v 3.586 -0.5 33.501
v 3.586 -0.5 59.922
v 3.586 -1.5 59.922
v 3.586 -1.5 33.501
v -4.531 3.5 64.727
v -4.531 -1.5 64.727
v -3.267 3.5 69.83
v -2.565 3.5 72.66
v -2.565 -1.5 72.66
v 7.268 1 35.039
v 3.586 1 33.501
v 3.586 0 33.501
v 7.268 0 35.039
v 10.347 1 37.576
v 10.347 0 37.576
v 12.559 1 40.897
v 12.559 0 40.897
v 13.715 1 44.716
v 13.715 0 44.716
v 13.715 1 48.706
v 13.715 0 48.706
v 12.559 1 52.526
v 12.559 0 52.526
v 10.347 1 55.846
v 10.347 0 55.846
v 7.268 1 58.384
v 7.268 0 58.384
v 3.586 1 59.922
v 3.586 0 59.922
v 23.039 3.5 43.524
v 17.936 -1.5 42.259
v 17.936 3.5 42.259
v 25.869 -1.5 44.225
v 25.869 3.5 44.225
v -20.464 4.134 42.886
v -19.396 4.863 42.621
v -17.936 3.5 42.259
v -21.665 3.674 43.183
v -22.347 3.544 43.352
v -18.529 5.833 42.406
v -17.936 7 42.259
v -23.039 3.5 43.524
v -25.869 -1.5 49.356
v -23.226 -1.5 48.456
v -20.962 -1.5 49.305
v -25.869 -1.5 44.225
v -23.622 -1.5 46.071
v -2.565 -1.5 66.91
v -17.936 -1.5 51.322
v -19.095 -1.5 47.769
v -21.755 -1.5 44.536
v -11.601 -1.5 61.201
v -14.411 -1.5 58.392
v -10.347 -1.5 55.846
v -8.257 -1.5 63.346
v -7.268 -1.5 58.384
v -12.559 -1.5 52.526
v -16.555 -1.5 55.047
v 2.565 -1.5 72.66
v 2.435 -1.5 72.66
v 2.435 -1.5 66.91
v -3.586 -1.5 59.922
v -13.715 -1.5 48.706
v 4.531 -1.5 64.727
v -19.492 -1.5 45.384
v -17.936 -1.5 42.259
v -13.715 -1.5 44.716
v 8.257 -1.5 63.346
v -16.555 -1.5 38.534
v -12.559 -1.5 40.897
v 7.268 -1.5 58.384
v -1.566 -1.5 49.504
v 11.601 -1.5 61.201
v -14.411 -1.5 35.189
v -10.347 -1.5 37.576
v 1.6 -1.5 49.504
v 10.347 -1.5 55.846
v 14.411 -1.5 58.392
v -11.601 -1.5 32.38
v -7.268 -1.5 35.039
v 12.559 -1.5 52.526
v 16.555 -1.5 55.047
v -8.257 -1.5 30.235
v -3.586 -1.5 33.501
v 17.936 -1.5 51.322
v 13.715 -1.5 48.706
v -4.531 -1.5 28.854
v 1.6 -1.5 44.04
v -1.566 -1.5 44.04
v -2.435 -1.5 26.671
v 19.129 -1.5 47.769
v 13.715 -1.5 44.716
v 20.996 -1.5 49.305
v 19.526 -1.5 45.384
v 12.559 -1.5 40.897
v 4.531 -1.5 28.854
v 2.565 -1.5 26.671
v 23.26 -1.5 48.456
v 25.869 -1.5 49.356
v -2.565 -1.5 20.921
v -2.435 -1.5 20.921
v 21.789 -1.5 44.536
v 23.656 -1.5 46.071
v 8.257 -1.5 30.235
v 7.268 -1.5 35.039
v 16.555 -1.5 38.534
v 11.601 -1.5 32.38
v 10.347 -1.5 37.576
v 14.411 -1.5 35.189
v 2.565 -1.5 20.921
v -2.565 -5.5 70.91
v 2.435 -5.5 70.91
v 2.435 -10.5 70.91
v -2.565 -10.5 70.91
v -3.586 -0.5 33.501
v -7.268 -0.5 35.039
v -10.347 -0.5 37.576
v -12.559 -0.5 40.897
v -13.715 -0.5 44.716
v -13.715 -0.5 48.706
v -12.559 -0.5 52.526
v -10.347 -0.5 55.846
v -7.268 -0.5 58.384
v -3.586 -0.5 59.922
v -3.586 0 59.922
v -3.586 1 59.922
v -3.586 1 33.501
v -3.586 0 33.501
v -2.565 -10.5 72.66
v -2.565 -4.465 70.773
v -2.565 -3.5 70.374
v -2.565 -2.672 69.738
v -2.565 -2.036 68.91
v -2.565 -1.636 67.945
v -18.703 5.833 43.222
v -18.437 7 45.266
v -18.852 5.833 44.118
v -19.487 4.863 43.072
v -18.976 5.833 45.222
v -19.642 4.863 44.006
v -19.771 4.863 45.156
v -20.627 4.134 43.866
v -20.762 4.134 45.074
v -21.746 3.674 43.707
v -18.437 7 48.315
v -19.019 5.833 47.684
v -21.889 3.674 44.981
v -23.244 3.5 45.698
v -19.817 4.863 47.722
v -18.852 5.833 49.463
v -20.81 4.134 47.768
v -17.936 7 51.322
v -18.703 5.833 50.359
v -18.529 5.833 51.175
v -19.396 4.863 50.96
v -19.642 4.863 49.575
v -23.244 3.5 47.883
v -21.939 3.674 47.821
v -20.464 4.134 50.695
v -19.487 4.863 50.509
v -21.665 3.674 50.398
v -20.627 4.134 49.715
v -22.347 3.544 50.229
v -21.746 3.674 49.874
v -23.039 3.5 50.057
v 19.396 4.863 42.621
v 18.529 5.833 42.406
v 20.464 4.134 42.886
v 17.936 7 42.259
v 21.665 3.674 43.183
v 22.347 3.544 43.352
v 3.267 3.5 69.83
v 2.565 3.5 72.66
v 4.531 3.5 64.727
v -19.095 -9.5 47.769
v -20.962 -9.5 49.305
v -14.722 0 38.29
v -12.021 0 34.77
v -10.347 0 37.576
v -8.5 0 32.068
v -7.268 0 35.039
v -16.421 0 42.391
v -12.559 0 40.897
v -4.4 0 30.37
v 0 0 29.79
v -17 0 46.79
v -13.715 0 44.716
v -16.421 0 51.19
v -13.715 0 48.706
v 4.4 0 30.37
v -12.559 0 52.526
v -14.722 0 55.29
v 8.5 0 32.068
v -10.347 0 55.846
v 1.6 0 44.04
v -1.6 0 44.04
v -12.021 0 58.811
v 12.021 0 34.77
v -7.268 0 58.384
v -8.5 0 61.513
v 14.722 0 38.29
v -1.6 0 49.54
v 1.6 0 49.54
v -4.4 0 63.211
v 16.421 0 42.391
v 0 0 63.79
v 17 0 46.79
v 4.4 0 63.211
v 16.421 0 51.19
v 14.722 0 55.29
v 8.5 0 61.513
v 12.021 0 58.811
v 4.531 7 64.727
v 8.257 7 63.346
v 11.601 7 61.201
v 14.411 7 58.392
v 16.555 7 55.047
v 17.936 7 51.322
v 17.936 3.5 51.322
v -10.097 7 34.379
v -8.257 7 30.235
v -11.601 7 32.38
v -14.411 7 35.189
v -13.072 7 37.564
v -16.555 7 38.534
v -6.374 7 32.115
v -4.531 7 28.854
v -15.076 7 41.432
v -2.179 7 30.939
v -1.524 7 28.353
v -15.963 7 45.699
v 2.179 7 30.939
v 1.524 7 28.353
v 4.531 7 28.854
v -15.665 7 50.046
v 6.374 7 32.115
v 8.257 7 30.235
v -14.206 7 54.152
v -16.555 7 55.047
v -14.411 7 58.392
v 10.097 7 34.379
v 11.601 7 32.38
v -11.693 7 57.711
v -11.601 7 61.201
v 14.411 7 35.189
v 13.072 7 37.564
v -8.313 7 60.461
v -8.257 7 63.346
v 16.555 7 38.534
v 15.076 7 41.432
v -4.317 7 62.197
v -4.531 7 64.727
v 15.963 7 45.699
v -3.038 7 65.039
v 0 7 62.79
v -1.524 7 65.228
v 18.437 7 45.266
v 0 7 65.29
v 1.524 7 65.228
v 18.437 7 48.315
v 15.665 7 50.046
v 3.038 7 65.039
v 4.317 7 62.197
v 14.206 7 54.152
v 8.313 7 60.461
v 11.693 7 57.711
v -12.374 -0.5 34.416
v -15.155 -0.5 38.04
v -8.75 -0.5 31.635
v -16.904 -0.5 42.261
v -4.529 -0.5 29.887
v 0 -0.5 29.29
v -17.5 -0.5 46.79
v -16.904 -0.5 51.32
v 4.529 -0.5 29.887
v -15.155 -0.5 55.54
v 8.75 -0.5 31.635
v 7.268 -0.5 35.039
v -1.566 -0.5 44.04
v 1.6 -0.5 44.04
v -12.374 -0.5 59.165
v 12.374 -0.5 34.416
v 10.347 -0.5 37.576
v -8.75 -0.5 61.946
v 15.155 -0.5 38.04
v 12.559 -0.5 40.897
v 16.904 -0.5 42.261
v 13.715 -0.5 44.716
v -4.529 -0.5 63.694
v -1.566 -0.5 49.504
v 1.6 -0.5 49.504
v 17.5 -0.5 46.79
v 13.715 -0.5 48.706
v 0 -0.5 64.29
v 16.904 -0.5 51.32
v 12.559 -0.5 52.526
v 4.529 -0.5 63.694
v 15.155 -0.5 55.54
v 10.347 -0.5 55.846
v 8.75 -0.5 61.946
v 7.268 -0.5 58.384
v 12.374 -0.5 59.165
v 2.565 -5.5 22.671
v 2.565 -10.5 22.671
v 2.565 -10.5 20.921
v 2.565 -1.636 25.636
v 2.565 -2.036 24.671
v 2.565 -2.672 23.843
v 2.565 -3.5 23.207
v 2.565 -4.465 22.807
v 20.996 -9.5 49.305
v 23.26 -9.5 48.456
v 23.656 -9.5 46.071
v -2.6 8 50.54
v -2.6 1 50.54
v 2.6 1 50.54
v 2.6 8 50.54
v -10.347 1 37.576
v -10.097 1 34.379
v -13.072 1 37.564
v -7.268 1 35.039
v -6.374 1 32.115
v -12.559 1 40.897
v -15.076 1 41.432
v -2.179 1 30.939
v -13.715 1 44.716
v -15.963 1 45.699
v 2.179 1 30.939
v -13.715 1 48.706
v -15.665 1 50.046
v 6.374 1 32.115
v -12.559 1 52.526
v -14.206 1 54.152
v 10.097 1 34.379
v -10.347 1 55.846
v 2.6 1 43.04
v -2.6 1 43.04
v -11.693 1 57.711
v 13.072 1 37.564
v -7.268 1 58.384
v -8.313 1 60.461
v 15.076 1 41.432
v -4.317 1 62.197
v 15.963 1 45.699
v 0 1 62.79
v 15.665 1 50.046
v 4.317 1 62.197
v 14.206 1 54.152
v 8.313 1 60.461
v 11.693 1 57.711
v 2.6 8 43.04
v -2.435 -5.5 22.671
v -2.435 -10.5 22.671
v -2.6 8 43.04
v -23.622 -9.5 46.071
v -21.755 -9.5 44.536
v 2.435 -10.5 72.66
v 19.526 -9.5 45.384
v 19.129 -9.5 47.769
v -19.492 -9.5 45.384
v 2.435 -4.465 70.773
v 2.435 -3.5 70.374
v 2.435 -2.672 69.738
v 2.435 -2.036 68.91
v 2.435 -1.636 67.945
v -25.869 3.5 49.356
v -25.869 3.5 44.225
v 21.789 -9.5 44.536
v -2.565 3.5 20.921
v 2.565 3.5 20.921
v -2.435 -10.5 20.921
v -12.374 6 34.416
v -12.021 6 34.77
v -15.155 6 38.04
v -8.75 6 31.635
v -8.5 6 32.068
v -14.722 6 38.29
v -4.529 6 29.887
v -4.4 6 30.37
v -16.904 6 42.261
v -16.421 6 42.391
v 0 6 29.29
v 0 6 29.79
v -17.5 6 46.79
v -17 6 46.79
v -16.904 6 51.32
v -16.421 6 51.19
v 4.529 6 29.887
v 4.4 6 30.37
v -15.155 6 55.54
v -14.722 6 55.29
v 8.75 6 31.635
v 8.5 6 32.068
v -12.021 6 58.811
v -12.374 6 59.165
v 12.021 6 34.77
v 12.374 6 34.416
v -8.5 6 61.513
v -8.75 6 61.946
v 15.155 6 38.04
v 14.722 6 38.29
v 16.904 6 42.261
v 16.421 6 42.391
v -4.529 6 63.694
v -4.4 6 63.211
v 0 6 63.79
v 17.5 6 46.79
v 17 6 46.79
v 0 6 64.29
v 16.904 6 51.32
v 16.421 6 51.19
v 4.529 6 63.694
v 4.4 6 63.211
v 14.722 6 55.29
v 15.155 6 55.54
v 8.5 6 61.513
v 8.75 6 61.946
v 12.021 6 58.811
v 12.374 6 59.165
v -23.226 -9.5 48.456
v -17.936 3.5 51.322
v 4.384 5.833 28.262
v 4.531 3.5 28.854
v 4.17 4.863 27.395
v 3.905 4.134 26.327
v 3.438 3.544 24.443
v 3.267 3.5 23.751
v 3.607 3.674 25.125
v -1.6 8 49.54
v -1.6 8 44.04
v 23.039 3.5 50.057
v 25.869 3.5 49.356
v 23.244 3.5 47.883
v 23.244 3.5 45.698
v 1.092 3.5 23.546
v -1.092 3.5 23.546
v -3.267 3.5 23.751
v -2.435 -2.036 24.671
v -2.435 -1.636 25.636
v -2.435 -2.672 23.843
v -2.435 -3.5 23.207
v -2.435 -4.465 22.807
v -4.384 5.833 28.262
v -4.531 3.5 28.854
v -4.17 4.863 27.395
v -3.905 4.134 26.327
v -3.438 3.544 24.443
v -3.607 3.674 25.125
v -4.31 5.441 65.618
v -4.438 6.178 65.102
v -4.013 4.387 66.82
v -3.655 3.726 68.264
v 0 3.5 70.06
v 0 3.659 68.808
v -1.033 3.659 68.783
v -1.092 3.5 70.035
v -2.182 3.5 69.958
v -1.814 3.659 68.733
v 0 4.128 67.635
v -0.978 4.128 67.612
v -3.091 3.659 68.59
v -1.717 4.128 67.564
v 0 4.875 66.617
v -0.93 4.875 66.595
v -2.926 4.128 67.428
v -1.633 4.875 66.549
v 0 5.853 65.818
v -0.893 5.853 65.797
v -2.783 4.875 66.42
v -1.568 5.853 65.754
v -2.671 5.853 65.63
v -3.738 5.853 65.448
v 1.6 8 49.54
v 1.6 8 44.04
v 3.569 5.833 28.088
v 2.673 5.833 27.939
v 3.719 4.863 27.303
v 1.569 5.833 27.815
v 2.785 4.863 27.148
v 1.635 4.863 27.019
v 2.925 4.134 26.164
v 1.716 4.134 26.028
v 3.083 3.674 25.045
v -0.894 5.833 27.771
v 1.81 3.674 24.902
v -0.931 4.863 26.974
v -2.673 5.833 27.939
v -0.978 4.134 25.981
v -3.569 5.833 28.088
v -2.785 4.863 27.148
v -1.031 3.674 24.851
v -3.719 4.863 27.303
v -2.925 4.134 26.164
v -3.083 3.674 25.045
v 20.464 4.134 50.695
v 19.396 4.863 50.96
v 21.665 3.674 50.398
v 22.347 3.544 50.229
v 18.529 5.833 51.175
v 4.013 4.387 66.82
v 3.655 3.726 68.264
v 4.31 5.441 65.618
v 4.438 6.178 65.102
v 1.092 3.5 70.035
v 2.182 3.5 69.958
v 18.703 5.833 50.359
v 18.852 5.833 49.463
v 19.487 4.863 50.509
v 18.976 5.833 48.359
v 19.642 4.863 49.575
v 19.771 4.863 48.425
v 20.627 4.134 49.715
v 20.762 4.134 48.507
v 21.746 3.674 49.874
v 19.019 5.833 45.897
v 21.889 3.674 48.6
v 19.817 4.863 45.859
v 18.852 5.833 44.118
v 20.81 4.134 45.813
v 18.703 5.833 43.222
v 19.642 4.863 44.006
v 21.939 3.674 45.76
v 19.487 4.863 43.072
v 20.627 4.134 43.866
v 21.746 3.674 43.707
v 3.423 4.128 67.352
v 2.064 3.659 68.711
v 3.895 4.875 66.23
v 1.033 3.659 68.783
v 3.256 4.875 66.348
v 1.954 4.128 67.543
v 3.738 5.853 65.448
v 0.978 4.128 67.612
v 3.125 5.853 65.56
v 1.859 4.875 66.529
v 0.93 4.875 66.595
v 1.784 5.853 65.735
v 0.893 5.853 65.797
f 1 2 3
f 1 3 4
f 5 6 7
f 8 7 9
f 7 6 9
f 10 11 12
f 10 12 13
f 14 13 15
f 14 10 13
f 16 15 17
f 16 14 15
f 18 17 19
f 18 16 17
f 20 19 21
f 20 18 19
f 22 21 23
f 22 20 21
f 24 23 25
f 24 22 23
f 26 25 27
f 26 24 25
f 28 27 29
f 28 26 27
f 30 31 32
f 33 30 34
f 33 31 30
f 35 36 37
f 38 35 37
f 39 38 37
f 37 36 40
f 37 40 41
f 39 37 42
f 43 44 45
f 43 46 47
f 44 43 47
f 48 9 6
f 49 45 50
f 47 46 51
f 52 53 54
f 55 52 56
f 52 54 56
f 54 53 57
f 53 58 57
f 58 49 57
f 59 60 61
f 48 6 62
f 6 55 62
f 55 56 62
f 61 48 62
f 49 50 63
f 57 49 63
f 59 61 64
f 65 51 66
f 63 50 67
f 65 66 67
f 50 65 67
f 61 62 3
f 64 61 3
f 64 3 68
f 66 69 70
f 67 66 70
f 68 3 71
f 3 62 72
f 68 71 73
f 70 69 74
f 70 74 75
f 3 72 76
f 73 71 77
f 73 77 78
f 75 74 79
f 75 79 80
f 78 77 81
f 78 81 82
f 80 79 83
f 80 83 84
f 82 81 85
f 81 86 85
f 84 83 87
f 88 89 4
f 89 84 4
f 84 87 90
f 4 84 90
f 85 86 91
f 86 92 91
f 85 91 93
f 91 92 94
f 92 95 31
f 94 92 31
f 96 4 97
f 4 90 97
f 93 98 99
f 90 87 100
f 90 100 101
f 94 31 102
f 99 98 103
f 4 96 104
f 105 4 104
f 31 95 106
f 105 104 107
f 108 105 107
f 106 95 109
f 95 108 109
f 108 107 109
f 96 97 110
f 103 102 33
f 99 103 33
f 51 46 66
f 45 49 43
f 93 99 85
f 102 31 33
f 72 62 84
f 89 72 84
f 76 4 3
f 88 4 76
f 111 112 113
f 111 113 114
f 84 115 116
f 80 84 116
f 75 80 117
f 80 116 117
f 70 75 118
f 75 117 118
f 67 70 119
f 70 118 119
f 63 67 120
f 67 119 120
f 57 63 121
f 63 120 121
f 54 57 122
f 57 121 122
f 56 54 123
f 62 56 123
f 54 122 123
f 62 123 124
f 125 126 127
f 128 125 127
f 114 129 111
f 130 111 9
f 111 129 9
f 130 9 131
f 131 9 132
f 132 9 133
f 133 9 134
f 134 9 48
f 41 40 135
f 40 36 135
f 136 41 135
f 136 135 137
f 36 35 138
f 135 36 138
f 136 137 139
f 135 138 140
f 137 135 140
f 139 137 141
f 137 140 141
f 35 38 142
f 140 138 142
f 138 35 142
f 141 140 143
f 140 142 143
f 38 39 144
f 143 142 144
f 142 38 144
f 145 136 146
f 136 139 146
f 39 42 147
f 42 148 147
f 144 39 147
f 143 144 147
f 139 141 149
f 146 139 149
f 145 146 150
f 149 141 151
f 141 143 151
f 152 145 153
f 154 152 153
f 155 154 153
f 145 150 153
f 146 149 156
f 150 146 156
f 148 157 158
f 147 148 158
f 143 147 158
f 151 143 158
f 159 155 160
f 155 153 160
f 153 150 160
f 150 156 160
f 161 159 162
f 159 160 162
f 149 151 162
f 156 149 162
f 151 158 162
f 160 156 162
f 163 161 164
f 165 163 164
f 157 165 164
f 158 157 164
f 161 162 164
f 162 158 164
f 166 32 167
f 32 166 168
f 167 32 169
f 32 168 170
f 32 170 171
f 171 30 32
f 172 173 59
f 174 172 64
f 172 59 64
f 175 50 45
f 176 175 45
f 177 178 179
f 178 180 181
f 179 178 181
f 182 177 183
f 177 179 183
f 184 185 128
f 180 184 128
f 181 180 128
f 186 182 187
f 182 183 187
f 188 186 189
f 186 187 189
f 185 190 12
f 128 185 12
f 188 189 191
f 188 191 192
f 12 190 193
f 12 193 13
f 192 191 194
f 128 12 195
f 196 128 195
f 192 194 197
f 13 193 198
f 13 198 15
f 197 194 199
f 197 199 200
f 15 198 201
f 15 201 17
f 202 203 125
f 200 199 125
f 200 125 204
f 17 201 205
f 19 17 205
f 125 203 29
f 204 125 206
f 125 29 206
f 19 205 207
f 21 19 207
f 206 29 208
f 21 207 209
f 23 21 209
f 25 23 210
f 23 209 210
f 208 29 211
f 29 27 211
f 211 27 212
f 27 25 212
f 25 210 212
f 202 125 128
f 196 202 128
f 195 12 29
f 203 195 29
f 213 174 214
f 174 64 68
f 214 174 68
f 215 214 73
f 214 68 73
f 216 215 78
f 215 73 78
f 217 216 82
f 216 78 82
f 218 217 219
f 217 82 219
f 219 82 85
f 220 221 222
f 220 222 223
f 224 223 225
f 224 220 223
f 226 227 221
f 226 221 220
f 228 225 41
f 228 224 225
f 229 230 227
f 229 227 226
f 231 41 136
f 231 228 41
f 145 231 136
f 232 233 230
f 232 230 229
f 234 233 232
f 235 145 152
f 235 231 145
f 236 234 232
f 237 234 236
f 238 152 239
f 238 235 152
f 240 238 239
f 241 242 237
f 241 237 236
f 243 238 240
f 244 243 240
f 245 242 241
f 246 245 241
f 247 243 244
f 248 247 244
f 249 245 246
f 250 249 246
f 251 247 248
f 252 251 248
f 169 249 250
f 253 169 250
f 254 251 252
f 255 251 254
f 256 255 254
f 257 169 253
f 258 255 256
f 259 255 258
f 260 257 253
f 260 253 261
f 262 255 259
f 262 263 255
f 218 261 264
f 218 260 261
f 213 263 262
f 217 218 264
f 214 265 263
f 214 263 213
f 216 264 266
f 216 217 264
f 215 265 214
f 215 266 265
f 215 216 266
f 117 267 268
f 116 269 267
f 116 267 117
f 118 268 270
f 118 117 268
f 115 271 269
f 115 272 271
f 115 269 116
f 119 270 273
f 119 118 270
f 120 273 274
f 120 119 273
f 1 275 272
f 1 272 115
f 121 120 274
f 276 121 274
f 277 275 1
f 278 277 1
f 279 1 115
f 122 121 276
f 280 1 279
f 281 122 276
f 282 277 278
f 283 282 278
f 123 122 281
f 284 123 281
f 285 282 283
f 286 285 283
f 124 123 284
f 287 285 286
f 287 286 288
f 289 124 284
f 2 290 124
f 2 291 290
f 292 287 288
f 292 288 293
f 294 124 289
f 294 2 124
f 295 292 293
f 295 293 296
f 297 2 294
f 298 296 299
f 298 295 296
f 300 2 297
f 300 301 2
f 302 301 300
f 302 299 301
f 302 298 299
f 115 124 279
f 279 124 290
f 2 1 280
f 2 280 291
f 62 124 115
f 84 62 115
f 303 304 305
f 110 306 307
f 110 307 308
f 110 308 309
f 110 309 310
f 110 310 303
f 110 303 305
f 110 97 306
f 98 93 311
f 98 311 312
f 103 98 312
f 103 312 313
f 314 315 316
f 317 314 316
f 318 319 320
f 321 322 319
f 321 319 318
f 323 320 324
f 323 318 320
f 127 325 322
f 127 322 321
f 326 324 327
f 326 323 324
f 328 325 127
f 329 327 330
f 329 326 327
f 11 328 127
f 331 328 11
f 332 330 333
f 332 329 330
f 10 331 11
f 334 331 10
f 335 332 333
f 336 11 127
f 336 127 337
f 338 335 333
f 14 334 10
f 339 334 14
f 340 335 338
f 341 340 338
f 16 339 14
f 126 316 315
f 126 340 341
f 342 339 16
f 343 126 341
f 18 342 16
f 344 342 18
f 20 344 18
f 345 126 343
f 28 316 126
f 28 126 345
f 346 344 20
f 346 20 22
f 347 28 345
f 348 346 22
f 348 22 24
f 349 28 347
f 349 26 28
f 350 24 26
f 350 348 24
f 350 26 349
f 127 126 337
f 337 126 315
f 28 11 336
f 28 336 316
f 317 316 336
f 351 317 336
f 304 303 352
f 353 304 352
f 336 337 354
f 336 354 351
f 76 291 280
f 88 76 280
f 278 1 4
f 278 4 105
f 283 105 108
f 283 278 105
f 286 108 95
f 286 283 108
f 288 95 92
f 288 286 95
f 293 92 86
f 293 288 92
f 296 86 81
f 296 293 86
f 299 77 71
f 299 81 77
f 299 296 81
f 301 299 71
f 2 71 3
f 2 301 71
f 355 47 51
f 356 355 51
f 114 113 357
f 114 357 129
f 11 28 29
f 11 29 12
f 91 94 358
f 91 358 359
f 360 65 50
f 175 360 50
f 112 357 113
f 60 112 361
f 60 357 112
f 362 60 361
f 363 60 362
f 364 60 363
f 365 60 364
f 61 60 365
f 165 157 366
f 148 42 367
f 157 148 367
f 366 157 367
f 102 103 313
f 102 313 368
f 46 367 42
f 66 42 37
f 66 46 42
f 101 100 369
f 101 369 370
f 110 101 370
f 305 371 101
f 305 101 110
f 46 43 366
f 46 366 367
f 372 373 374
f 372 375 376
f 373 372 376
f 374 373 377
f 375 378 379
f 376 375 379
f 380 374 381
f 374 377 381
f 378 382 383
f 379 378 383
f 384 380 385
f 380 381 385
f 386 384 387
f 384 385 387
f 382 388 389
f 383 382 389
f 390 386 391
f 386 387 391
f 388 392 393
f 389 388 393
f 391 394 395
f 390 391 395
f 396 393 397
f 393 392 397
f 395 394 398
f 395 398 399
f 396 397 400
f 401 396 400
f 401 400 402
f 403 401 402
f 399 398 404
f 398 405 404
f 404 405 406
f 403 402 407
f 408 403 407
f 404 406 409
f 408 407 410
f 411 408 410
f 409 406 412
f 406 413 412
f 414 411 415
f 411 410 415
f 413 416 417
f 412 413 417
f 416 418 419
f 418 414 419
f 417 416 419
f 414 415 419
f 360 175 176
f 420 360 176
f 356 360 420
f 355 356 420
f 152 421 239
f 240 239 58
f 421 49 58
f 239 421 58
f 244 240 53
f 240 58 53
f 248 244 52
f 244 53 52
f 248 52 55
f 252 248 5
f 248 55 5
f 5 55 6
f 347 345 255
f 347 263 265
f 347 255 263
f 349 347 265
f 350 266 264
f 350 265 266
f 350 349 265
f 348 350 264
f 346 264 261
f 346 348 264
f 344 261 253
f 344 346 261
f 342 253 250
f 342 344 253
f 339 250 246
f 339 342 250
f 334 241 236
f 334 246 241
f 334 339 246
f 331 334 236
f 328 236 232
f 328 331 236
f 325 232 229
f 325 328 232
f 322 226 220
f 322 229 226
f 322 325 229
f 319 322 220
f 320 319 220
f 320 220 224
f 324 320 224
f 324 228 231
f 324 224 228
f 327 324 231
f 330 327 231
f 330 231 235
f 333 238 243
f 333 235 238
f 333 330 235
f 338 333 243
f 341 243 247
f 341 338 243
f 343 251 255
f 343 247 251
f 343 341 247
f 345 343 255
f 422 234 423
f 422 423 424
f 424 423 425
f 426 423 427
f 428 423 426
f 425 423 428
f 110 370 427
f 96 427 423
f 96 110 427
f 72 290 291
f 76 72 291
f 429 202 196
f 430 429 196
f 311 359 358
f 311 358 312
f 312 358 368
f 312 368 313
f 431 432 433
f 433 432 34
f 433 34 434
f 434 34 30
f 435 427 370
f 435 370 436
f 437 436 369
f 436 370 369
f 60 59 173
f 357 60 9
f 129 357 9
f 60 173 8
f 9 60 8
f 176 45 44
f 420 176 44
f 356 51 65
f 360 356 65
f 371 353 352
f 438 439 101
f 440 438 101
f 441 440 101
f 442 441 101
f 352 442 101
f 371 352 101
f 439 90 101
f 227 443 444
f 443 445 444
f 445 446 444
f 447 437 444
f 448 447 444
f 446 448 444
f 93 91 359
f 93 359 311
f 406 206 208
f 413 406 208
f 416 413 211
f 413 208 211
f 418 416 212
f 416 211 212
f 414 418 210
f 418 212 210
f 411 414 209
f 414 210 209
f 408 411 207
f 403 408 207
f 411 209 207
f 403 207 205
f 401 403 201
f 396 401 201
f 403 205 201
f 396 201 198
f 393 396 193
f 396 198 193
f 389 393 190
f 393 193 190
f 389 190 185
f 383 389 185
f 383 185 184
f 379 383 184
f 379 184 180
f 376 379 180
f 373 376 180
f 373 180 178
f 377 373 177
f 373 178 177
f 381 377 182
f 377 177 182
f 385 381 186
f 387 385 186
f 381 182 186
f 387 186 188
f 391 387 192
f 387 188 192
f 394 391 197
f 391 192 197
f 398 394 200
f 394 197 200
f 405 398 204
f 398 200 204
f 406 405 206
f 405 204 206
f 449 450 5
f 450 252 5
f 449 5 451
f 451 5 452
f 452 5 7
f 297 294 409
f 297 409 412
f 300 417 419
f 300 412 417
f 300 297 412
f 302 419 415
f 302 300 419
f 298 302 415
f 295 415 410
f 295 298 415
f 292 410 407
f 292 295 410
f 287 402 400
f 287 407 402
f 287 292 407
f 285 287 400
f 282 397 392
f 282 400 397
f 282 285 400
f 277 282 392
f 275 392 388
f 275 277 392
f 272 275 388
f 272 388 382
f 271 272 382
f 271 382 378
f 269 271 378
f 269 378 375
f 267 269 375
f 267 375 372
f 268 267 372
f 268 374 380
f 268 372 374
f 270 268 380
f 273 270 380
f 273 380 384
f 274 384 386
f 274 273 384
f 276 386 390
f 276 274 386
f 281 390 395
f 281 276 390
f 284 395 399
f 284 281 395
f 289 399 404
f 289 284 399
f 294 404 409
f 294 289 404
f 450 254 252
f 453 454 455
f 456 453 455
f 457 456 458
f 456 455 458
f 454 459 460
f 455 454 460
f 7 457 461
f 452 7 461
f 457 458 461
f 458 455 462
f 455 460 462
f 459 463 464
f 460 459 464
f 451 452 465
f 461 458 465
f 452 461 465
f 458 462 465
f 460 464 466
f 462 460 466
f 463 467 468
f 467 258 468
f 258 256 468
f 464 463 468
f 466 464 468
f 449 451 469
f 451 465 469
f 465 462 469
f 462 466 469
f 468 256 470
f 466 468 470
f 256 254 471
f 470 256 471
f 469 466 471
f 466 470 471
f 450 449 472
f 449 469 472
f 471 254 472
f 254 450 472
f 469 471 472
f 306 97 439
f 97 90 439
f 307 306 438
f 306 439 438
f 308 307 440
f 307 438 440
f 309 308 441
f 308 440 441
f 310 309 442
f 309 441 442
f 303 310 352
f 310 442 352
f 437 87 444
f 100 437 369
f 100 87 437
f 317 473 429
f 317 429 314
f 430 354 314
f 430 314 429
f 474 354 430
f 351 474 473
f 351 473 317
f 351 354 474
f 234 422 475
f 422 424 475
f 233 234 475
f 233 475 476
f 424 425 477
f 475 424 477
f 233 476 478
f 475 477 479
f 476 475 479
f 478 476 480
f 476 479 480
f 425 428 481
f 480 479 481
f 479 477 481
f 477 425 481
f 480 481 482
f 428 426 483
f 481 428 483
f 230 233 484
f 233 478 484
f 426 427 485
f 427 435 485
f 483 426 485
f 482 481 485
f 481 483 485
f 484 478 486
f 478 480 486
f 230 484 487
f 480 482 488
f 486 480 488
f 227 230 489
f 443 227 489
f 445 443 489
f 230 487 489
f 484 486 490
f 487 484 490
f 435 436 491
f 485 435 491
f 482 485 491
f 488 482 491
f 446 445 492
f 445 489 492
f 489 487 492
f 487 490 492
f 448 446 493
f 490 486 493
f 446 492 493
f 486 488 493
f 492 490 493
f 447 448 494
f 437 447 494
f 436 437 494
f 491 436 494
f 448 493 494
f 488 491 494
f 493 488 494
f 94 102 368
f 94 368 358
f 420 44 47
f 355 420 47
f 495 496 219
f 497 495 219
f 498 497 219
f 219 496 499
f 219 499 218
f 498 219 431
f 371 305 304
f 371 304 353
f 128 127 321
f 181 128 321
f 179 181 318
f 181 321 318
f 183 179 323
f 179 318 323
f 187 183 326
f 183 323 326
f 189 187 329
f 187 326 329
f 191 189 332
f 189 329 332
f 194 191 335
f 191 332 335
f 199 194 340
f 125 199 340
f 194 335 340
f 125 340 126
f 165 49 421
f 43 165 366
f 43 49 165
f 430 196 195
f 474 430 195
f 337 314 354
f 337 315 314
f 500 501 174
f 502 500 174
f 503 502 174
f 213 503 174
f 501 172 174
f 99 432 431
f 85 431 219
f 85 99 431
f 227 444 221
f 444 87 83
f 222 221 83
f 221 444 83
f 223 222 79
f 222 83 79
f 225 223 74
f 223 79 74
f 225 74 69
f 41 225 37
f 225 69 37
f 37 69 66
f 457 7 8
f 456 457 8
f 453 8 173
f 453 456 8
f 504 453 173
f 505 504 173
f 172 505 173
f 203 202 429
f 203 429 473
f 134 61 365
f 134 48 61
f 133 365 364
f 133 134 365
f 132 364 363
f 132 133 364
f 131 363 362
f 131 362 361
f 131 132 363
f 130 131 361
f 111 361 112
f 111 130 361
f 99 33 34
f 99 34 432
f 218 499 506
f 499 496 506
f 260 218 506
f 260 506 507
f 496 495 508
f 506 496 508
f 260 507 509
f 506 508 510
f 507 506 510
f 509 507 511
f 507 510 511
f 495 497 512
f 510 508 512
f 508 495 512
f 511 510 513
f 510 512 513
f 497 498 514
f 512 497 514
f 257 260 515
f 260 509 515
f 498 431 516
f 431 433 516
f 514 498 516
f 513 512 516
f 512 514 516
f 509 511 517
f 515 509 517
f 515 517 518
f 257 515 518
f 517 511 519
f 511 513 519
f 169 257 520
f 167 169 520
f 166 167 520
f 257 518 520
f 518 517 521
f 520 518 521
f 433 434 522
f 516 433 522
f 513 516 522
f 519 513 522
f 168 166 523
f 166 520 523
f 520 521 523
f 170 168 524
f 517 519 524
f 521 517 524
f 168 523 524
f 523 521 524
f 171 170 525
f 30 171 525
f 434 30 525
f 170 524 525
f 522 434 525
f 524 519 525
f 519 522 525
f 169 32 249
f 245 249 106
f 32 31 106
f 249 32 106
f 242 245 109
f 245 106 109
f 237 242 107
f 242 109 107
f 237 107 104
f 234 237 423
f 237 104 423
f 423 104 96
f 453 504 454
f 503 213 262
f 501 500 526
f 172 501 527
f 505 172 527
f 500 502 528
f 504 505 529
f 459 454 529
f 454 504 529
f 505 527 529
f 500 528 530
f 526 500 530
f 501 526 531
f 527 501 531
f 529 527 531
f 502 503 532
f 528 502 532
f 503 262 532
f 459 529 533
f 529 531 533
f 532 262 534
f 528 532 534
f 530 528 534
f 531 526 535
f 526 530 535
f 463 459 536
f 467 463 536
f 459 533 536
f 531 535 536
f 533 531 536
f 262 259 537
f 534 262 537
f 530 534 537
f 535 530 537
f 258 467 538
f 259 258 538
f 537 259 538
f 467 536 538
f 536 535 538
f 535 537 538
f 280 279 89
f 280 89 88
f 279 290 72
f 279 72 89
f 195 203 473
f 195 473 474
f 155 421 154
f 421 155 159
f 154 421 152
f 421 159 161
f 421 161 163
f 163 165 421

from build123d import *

# Parameters (mm, degrees)
SKETCH4_R                = 17
BOSS_EXTRUDE3_DEPTH      = 6
SHELL4_T                 = 0.5
SKETCH5_W                = 3.2
SKETCH5_H                = 5.5
BOSS_EXTRUDE4_DEPTH      = 8
SHELL5_T                 = 1
BOSS_EXTRUDE6_DEPTH      = 3.5
BOSS_EXTRUDE6_DEPTH_BACK = 1.5
SKETCH7_W                = 5
SKETCH7_H                = 1.75
BOSS_EXTRUDE7_DEPTH      = 9
FILLET3_R                = 5
CUT_EXTRUDE1_DEPTH       = 5
SKETCH13_W               = 3.166032567
SKETCH13_H               = 5.463514234
CUT_EXTRUDE2_DEPTH       = 5
FILLET4_R                = 4
BOSS_EXTRUDE8_DEPTH      = 8


with BuildPart() as part:
    # Sketch4 → Boss-Extrude3 (new body)
    with BuildSketch(Plane(origin=(0, 0, 0), x_dir=(1, 0, 0), z_dir=(0, 1, 0))):
        with Locations(Location((0, -46.79046007, 0), (0, 0, 270))):
            Circle(SKETCH4_R)
    extrude(amount=BOSS_EXTRUDE3_DEPTH)

    # Shell4
    shell4_openings = [part.faces().sort_by_distance(p)[0] for p in [
        (0, 6, 46.79046007),
    ]]
    offset(amount=SHELL4_T, openings=shell4_openings, kind=Kind.INTERSECTION)

    # Sketch5 → Boss-Extrude4 (add)
    with BuildSketch(Plane(origin=(0, 0, 0), x_dir=(1, 0, 0), z_dir=(0, 1, 0))):
        with Locations((0, -46.79046007)):
            Rectangle(SKETCH5_W, SKETCH5_H)
    extrude(amount=BOSS_EXTRUDE4_DEPTH)

    # Shell5
    shell5_openings = [part.faces().sort_by_distance(p)[0] for p in [
        (0, 8, 46.79046007),
    ]]
    offset(amount=SHELL5_T, openings=shell5_openings, kind=Kind.INTERSECTION)

    # Sketch6 → Boss-Extrude6 (add, two sides: drawn at the far end of the back side and taken through both)
    with BuildSketch(Plane(origin=(0, 0, 0), x_dir=(1, 0, 0), z_dir=(0, 1, 0)).offset(-BOSS_EXTRUDE6_DEPTH_BACK)):
        with BuildLine():
            Line((-2.565219646, -72.659781842), (2.565219646, -72.659781842))
            Line((2.565219646, -72.659781842), (4.531236217, -64.726956337))
            ThreePointArc((4.531236217, -64.726956337), (0, -65.29046007), (-4.531236217, -64.726956337))
            Line((-4.531236217, -64.726956337), (-2.565219646, -72.659781842))
        make_face()
        with BuildLine():
            Line((-25.869321772, -44.225240424), (-17.936496267, -42.259223853))
            ThreePointArc((-17.936496267, -42.259223853), (-18.5, -46.79046007), (-17.936496267, -51.321696288))
            Line((-17.936496267, -51.321696288), (-25.869321772, -49.355679717))
            Line((-25.869321772, -49.355679717), (-25.869321772, -44.225240424))
        make_face()
        with BuildLine():
            Line((2.565219646, -20.921138298), (4.531236217, -28.853963803))
            ThreePointArc((4.531236217, -28.853963803), (0, -28.29046007), (-4.531236217, -28.853963803))
            Line((-4.531236217, -28.853963803), (-2.565219646, -20.921138298))
            Line((-2.565219646, -20.921138298), (2.565219646, -20.921138298))
        make_face()
        with BuildLine():
            Line((25.869321772, -49.355679717), (17.936496267, -51.321696288))
            ThreePointArc((17.936496267, -51.321696288), (18.5, -46.79046007), (17.936496267, -42.259223853))
            Line((17.936496267, -42.259223853), (25.869321772, -44.225240424))
            Line((25.869321772, -44.225240424), (25.869321772, -49.355679717))
        make_face()
    extrude(amount=BOSS_EXTRUDE6_DEPTH + BOSS_EXTRUDE6_DEPTH_BACK)

    # Sketch7 → Boss-Extrude7 (add)
    with BuildSketch(Plane(origin=(0, -1.5, 0), x_dir=(-1, 0, 0), z_dir=(0, -1, 0))):
        with Locations((0.065219646, -71.784781842)):
            Rectangle(SKETCH7_W, SKETCH7_H)
        with Locations((-0.065219646, -21.796138298)):
            Rectangle(SKETCH7_W, SKETCH7_H)
    extrude(amount=BOSS_EXTRUDE7_DEPTH)

    # Fillet3
    # the kernel refuses this fillet: 5 mm, written as the material it adds along each edge
    with BuildSketch(Plane(origin=(0, 3.5, 46.79046007), x_dir=(-0.6278344871312538, 0, -0.7783468743231616), z_dir=(0.7783468743231616, 0, -0.6278344871312538))) as fillet3_piece_1_section:
        with BuildLine():
            CenterArc((23.269696007, 5), FILLET3_R, 197.457603124, 72.542396876)
            Line((23.269696007, 0), (23.269696007, -0.1))
            Line((23.269696007, -0.1), (18.5, -0.1))
            Line((18.5, -0.1), (18.4, 0))
            ThreePointArc((18.4, 0), (18.4, 1.75), (18.40460608, 3.47))
            Line((18.40460608, 3.47), (18.5, 3.5))
        make_face()
    fillet3_piece_1 = revolve(axis=Axis((0, 3.5, 46.79046007), (0, 1, 0)), revolution_arc=102.218929963, mode=Mode.PRIVATE)
    fillet3_piece_1 = split(fillet3_piece_1, bisect_by=Plane(origin=(-20.380505818, 4.426759582, 42.864930265), z_dir=(0.24055555302697984, 0, 0.9706353722731745)), keep=Keep.TOP, mode=Mode.PRIVATE)
    fillet3_piece_1 = split(fillet3_piece_1, bisect_by=Plane(origin=(-20.380505744, 4.426759582, 50.715989893), z_dir=(0.24055555302697348, 0, -0.9706353722731761)), keep=Keep.TOP, mode=Mode.PRIVATE)
    add(fillet3_piece_1)
    with BuildSketch(Plane(origin=(0, 3.5, 46.79046007), x_dir=(0.7783347748418207, 0, 0.6278494869568123), z_dir=(0.6278494869568123, 0, -0.7783347748418207))) as fillet3_piece_2_section:
        with BuildLine():
            CenterArc((23.269696007, -5), FILLET3_R, 90, 72.542396876)
            Line((23.269696007, 0), (23.269696007, 0.1))
            Line((23.269696007, 0.1), (18.5, 0.1))
            Line((18.5, 0.1), (18.4, 0))
            ThreePointArc((18.4, 0), (18.4, -1.75), (18.40460608, -3.47))
            Line((18.40460608, -3.47), (18.5, -3.5))
        make_face()
    fillet3_piece_2 = revolve(axis=Axis((0, 3.5, 46.79046007), (0, -1, 0)), revolution_arc=51.108360804, mode=Mode.PRIVATE)
    fillet3_piece_2 = split(fillet3_piece_2, bisect_by=Plane(origin=(4.048850537, 4.426759722, 66.673369956), z_dir=(-0.970635372273176, 0, -0.24055555302697343)), keep=Keep.TOP, mode=Mode.PRIVATE)
    add(fillet3_piece_2)
    with BuildSketch(Plane(origin=(0, 3.5, 46.79046007), x_dir=(0.7783468743230912, 0, -0.6278344871313409), z_dir=(0.6278344871313409, 0, 0.7783468743230912))) as fillet3_piece_3_section:
        with BuildLine():
            CenterArc((23.269696007, 5), FILLET3_R, 197.457603124, 72.542396876)
            Line((23.269696007, 0), (23.269696007, -0.1))
            Line((23.269696007, -0.1), (18.5, -0.1))
            Line((18.5, -0.1), (18.4, 0))
            ThreePointArc((18.4, 0), (18.4, 1.75), (18.40460608, 3.47))
            Line((18.40460608, 3.47), (18.5, 3.5))
        make_face()
    fillet3_piece_3 = revolve(axis=Axis((0, 3.5, 46.79046007), (0, 1, 0)), revolution_arc=102.218929963, mode=Mode.PRIVATE)
    fillet3_piece_3 = split(fillet3_piece_3, bisect_by=Plane(origin=(3.925529805, 4.426759582, 26.409954252), z_dir=(-0.9706353722731743, 0, 0.24055555302698087)), keep=Keep.TOP, mode=Mode.PRIVATE)
    fillet3_piece_3 = split(fillet3_piece_3, bisect_by=Plane(origin=(-3.925529823, 4.426759582, 26.409954326), z_dir=(0.9706353722731764, 0, 0.2405555530269717)), keep=Keep.TOP, mode=Mode.PRIVATE)
    add(fillet3_piece_3)
    with BuildSketch(Plane(origin=(0, 3.5, 46.79046007), x_dir=(0.6278344871312218, 0, 0.7783468743231875), z_dir=(-0.7783468743231875, 0, 0.6278344871312218))) as fillet3_piece_4_section:
        with BuildLine():
            CenterArc((23.269696007, 5), FILLET3_R, 197.457603124, 72.542396876)
            Line((23.269696007, 0), (23.269696007, -0.1))
            Line((23.269696007, -0.1), (18.5, -0.1))
            Line((18.5, -0.1), (18.4, 0))
            ThreePointArc((18.4, 0), (18.4, 1.75), (18.40460608, 3.47))
            Line((18.40460608, 3.47), (18.5, 3.5))
        make_face()
    fillet3_piece_4 = revolve(axis=Axis((0, 3.5, 46.79046007), (0, 1, 0)), revolution_arc=102.218929963, mode=Mode.PRIVATE)
    fillet3_piece_4 = split(fillet3_piece_4, bisect_by=Plane(origin=(20.380505818, 4.426759582, 50.715989875), z_dir=(-0.24055555302698112, 0, -0.9706353722731741)), keep=Keep.TOP, mode=Mode.PRIVATE)
    fillet3_piece_4 = split(fillet3_piece_4, bisect_by=Plane(origin=(20.380505744, 4.426759582, 42.864930247), z_dir=(-0.24055555302697304, 0, 0.9706353722731761)), keep=Keep.TOP, mode=Mode.PRIVATE)
    add(fillet3_piece_4)
    with BuildSketch(Plane(origin=(0, 3.5, 46.79046007), x_dir=(0, 0, 1), z_dir=(1, 0, 0))) as fillet3_piece_5_section:
        with BuildLine():
            CenterArc((23.269696007, -5), FILLET3_R, 90, 72.542396876)
            Line((23.269696007, 0), (23.269696007, 0.1))
            Line((23.269696007, 0.1), (18.5, 0.1))
            Line((18.5, 0.1), (18.4, 0))
            ThreePointArc((18.4, 0), (18.4, -1.75), (18.40460608, -3.47))
            Line((18.40460608, -3.47), (18.5, -3.5))
        make_face()
    fillet3_piece_5 = revolve(axis=Axis((0, 3.5, 46.79046007), (0, -1, 0)), revolution_arc=51.108360804, mode=Mode.PRIVATE)
    fillet3_piece_5 = split(fillet3_piece_5, bisect_by=Plane(origin=(-4.04885046, 4.426759578, 66.673370268), z_dir=(0.9706353722731745, 0, -0.24055555302697917)), keep=Keep.TOP, mode=Mode.PRIVATE)
    add(fillet3_piece_5)

    # Sketch11 → Cut-Extrude1 (cut)
    with BuildSketch(Plane(origin=(0, 1, 0), x_dir=(1, 0, 0), z_dir=(0, 1, 0))):
        with BuildLine():
            Line((-3.585868376, -59.921550203), (-3.585868376, -33.501237191))
            ThreePointArc((-3.585868376, -33.501237191), (-13.861572731, -46.711393697), (-3.585868376, -59.921550203))
        make_face()
        with BuildLine():
            Line((3.585868376, -59.921550203), (3.585868376, -33.501237191))
            ThreePointArc((3.585868376, -33.501237191), (13.861572731, -46.711393697), (3.585868376, -59.921550203))
        make_face()
    extrude(amount=-CUT_EXTRUDE1_DEPTH, mode=Mode.SUBTRACT)

    # Sketch13 → Cut-Extrude2 (cut)
    with BuildSketch(Plane(origin=(0, -0.5, 0), x_dir=(1, 0, 0), z_dir=(0, 1, 0))):
        with Locations((0.016983716, -46.772217187)):
            Rectangle(SKETCH13_W, SKETCH13_H)
    extrude(amount=-CUT_EXTRUDE2_DEPTH, mode=Mode.SUBTRACT)

    # Fillet4
    fillet4_edges = [part.edges().sort_by_distance(p)[0] for p in [
        (0.065219646, -1.5, 22.671138298),
        (-0.065219646, -1.5, 70.909781842),
    ]]
    fillet(fillet4_edges, radius=FILLET4_R)

    # Sketch16 → Boss-Extrude8 (add)
    with BuildSketch(Plane(origin=(0, -1.5, 0), x_dir=(-1, 0, 0), z_dir=(0, -1, 0))):
        Polygon((19.095115037, -47.769177252), (20.96203058, -49.305079029), (23.225618307, -48.456233631), (23.622290493, -46.071486456), (21.75537495, -44.535584679), (19.491787223, -45.384430077), align=None)
        Polygon((-19.525754656, -45.384430077), (-19.12908247, -47.769177252), (-20.995998013, -49.305079029), (-23.25958574, -48.456233631), (-23.656257926, -46.071486456), (-21.789342383, -44.535584679), align=None)
    extrude(amount=BOSS_EXTRUDE8_DEPTH)


solid = part.part
